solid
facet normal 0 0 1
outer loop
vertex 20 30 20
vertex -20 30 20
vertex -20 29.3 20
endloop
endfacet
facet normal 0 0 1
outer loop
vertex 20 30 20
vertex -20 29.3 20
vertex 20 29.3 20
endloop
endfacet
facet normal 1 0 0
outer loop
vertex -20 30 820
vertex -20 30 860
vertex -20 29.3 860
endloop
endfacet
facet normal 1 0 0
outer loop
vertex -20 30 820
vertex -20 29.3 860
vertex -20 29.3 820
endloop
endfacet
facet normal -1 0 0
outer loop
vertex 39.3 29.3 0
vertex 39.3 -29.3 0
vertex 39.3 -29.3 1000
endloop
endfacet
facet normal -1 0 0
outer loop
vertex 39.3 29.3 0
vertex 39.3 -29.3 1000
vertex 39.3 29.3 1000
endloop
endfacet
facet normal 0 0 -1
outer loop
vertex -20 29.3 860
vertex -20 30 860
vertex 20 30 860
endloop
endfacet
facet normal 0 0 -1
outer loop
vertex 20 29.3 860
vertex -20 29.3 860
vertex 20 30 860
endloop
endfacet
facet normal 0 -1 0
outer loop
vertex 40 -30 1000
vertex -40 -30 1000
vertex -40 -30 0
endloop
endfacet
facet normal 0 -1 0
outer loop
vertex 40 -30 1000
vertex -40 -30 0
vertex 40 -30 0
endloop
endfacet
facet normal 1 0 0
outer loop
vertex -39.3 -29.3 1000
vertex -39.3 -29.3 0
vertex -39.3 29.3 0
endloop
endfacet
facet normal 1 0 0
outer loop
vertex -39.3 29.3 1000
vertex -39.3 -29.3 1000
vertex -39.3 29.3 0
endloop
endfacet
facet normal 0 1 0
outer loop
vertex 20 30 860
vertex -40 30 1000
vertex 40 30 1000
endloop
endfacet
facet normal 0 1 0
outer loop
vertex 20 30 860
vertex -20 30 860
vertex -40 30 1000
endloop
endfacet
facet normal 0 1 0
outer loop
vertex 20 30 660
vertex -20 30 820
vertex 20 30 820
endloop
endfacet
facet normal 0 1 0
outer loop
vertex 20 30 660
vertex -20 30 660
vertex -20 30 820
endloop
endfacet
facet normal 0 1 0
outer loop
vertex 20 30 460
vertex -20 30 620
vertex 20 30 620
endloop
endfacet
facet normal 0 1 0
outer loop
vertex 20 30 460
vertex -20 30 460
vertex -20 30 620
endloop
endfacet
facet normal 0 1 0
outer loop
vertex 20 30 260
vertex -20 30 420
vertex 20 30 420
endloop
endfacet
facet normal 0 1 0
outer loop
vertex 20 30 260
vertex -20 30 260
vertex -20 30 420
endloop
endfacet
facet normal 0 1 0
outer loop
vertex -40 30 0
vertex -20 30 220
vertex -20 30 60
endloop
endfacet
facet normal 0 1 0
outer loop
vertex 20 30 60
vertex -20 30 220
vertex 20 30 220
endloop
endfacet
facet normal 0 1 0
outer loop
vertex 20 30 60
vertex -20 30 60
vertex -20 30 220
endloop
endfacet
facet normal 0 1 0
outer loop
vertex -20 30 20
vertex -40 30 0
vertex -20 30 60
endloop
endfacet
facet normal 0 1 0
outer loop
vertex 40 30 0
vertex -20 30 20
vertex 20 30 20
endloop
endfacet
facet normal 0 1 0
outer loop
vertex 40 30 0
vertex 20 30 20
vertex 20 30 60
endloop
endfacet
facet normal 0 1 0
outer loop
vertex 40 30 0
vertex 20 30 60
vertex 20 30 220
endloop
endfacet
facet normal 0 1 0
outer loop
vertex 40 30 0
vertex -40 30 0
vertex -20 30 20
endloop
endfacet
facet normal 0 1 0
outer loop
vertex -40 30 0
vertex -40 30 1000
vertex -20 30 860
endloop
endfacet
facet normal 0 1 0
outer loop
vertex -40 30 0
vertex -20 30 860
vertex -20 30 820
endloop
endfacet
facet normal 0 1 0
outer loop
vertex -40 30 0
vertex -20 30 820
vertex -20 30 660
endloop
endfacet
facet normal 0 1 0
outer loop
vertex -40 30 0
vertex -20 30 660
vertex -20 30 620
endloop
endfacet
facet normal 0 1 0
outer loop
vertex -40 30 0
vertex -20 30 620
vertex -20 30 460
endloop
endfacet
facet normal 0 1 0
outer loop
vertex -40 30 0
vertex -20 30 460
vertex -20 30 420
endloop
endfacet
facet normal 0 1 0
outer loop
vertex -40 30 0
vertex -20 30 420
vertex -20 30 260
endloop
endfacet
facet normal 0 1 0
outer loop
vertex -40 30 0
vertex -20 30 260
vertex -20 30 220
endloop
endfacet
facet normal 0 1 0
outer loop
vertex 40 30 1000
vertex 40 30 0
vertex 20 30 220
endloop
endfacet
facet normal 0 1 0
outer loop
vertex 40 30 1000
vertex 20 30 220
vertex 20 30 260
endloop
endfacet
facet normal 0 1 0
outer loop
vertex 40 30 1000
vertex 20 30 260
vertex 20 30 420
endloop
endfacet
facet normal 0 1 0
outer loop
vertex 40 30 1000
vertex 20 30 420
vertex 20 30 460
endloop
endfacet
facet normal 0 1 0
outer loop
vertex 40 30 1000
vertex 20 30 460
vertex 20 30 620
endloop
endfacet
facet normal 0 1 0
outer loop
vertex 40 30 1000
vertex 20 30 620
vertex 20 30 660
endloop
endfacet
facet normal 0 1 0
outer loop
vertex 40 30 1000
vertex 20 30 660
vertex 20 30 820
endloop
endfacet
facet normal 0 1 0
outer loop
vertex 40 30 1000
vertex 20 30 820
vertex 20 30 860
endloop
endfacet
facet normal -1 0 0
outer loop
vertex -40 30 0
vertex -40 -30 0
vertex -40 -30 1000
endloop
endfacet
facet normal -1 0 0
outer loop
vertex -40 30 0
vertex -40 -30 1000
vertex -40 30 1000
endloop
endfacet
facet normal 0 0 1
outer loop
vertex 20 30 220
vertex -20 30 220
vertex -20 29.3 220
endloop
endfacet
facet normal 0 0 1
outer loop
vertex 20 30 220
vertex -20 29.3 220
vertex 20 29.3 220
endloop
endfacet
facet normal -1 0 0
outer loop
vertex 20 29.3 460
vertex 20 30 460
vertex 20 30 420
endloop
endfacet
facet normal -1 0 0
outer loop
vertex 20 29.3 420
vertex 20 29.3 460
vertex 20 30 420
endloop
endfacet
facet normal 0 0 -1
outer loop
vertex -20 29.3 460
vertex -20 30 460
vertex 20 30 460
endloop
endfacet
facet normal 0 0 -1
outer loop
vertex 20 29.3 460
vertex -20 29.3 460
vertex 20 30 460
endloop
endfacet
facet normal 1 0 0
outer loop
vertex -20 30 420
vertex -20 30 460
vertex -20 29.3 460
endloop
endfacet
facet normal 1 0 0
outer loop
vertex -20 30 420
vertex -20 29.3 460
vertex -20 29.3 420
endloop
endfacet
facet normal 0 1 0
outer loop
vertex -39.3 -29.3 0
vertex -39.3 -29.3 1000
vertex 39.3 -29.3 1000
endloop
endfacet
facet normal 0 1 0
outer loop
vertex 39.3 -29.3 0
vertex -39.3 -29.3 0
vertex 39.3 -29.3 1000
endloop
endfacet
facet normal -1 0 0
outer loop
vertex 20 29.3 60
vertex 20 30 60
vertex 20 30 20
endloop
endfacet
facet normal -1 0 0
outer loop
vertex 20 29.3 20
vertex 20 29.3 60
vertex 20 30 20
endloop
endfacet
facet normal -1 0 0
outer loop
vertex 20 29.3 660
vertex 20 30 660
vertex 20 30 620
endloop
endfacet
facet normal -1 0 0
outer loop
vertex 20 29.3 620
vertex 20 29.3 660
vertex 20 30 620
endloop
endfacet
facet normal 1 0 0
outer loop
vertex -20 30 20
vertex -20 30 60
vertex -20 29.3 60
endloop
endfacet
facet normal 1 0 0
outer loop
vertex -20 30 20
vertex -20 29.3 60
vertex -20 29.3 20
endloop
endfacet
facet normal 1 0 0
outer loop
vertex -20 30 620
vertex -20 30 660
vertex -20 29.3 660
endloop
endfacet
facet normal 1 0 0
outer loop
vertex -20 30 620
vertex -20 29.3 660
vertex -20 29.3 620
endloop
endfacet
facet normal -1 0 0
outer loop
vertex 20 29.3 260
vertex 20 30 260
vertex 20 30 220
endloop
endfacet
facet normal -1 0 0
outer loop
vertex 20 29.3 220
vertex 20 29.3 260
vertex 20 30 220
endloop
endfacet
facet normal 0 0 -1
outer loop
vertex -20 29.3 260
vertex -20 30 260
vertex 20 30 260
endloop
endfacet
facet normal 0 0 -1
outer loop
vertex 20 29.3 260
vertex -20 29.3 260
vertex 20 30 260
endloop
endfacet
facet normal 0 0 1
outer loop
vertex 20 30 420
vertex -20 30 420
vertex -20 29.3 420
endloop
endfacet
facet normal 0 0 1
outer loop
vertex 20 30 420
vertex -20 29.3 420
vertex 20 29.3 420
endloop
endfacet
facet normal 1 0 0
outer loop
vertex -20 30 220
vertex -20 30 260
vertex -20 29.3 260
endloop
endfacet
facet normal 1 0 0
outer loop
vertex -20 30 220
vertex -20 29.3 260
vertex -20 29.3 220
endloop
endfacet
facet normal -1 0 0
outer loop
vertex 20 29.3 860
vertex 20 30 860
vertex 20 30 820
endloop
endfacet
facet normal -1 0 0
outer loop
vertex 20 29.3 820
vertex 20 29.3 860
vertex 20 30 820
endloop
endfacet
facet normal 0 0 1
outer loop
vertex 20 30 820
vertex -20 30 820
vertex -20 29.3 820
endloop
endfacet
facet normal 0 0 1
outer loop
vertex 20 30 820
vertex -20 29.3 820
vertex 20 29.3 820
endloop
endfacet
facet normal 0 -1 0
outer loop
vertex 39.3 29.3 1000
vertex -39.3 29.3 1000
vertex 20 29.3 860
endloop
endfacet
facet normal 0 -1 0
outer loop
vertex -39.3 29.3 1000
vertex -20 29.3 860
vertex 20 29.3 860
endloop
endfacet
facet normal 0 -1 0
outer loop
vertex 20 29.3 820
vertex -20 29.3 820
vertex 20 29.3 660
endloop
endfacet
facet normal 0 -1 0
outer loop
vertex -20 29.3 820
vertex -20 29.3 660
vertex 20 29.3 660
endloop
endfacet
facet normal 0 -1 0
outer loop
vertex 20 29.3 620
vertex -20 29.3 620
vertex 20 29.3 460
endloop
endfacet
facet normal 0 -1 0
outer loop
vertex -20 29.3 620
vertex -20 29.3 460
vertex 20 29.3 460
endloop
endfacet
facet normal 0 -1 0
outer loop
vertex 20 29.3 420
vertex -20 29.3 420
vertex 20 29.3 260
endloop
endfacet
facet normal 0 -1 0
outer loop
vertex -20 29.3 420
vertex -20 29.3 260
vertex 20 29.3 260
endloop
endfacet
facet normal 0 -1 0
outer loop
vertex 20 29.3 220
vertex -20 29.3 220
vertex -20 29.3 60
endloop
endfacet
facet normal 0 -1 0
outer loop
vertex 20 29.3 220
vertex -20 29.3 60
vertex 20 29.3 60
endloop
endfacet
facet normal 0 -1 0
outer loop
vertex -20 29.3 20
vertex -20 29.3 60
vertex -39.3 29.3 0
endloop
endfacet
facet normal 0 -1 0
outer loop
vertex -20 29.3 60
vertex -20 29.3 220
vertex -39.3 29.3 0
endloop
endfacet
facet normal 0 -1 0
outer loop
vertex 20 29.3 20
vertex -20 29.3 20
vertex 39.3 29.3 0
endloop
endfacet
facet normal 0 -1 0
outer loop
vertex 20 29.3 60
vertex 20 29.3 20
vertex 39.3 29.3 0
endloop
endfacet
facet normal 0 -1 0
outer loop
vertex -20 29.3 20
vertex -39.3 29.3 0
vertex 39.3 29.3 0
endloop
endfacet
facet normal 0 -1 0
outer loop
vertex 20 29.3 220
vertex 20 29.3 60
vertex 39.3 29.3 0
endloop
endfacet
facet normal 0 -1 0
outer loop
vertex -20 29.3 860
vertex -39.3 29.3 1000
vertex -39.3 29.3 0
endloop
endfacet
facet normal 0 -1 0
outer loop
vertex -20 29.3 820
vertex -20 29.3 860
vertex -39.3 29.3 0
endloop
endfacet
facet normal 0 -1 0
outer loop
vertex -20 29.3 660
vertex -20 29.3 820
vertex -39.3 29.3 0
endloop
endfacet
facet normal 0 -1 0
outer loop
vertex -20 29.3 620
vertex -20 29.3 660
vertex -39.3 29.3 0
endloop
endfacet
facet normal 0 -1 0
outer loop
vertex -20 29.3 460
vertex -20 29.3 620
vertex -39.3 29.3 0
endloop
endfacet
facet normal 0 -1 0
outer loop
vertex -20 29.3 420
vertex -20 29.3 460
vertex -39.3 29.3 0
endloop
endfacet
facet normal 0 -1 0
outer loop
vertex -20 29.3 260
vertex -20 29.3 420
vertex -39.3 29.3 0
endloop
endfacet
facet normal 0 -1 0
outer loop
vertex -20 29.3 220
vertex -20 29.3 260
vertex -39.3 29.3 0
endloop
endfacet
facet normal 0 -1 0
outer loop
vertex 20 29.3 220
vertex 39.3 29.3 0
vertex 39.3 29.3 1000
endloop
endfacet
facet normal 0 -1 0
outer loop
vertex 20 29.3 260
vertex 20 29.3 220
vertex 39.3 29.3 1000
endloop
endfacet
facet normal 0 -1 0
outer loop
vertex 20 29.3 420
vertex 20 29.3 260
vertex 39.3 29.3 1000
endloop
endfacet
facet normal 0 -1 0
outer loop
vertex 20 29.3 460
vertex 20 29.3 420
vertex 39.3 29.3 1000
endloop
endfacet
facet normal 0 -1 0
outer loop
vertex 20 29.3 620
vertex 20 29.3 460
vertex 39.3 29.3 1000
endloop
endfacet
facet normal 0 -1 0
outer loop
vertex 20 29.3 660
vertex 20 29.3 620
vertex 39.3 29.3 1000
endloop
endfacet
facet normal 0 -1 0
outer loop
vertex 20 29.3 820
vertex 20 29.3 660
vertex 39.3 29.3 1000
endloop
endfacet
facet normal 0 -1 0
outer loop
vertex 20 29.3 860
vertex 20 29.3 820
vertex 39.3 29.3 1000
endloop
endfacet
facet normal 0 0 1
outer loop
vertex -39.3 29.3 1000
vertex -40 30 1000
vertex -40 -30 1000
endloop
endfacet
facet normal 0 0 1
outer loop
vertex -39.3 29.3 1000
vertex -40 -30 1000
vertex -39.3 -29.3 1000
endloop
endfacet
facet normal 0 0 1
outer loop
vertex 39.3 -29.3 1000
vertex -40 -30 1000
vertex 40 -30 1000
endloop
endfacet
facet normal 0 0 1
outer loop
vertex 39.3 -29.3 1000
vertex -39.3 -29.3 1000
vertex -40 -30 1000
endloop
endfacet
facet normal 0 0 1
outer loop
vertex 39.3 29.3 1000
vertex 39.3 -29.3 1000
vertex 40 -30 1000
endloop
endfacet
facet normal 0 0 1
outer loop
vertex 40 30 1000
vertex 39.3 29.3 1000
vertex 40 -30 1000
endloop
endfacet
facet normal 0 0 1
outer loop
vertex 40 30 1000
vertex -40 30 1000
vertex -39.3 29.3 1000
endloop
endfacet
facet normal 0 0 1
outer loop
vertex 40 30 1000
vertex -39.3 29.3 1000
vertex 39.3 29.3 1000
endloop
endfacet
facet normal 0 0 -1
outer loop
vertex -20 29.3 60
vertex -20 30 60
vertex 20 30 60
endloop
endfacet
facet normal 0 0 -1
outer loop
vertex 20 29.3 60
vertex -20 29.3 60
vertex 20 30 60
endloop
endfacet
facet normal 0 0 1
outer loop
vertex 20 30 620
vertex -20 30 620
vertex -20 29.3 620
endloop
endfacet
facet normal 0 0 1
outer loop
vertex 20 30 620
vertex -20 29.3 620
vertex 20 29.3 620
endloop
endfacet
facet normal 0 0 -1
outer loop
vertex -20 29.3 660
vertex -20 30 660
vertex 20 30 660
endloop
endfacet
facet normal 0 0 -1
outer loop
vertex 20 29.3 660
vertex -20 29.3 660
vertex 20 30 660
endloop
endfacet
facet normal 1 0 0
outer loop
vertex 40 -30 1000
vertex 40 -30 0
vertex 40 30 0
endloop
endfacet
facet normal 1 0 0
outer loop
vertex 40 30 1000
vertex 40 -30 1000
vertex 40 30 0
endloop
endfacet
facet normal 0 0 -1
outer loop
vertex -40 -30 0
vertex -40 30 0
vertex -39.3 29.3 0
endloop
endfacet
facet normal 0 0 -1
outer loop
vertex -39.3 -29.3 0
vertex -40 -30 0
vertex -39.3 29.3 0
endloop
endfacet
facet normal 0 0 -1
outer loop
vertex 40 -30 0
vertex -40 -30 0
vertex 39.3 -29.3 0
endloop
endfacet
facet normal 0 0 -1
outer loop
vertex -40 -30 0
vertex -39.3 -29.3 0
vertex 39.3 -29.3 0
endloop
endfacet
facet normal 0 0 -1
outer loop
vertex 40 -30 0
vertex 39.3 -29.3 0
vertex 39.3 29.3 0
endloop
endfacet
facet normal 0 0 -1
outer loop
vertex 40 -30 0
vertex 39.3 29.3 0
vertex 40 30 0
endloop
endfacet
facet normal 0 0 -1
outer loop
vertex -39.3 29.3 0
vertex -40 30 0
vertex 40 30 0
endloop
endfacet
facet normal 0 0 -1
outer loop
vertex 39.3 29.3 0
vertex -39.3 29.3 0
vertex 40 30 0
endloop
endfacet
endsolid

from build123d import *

# Parameters (mm, degrees)
SKETCH_1_W             = 80
SKETCH_1_H             = 60
SKETCH_1_W_2           = 78.6
SKETCH_1_H_2           = 58.6
EXTRUDE_1_DEPTH        = 1000
CUT_EXTRUDE_1_REACH    = 1004.597
SKETCH_2_W             = 40
SKETCH_2_H             = 40
PATTERN_LINEAR_1_COUNT = 5
PATTERN_LINEAR_1_PITCH = 200


with BuildPart() as part:
    # 스케치1 → 보스-돌출1 (new body)
    with BuildSketch(Plane.XY):
        Rectangle(SKETCH_1_W, SKETCH_1_H)
        Rectangle(SKETCH_1_W_2, SKETCH_1_H_2, mode=Mode.SUBTRACT)
    extrude(amount=EXTRUDE_1_DEPTH)

    # 스케치2 → 컷-돌출1 (cut, up to next)
    with BuildSketch(Plane(origin=(0, 30, 0), x_dir=(1, 0, 0), z_dir=(0, 1, 0)), mode=Mode.PRIVATE) as cut_extrude_1_sk1:
        with Locations((0, -40)):
            Rectangle(SKETCH_2_W, SKETCH_2_H)
    cut_extrude_1_tool1 = extrude(cut_extrude_1_sk1.sketch, amount=-CUT_EXTRUDE_1_REACH, mode=Mode.PRIVATE) & part.part
    cut_extrude_1 = cut_extrude_1_tool1.solids().sort_by_distance((0, 30, 40))[0]
    add(cut_extrude_1, mode=Mode.SUBTRACT)

    # 선형 패턴1: 컷-돌출1 ×5
    with Locations(*[(0, 0, i * PATTERN_LINEAR_1_PITCH) for i in range(1, PATTERN_LINEAR_1_COUNT)]):
        add(cut_extrude_1, mode=Mode.SUBTRACT)


solid = part.part
